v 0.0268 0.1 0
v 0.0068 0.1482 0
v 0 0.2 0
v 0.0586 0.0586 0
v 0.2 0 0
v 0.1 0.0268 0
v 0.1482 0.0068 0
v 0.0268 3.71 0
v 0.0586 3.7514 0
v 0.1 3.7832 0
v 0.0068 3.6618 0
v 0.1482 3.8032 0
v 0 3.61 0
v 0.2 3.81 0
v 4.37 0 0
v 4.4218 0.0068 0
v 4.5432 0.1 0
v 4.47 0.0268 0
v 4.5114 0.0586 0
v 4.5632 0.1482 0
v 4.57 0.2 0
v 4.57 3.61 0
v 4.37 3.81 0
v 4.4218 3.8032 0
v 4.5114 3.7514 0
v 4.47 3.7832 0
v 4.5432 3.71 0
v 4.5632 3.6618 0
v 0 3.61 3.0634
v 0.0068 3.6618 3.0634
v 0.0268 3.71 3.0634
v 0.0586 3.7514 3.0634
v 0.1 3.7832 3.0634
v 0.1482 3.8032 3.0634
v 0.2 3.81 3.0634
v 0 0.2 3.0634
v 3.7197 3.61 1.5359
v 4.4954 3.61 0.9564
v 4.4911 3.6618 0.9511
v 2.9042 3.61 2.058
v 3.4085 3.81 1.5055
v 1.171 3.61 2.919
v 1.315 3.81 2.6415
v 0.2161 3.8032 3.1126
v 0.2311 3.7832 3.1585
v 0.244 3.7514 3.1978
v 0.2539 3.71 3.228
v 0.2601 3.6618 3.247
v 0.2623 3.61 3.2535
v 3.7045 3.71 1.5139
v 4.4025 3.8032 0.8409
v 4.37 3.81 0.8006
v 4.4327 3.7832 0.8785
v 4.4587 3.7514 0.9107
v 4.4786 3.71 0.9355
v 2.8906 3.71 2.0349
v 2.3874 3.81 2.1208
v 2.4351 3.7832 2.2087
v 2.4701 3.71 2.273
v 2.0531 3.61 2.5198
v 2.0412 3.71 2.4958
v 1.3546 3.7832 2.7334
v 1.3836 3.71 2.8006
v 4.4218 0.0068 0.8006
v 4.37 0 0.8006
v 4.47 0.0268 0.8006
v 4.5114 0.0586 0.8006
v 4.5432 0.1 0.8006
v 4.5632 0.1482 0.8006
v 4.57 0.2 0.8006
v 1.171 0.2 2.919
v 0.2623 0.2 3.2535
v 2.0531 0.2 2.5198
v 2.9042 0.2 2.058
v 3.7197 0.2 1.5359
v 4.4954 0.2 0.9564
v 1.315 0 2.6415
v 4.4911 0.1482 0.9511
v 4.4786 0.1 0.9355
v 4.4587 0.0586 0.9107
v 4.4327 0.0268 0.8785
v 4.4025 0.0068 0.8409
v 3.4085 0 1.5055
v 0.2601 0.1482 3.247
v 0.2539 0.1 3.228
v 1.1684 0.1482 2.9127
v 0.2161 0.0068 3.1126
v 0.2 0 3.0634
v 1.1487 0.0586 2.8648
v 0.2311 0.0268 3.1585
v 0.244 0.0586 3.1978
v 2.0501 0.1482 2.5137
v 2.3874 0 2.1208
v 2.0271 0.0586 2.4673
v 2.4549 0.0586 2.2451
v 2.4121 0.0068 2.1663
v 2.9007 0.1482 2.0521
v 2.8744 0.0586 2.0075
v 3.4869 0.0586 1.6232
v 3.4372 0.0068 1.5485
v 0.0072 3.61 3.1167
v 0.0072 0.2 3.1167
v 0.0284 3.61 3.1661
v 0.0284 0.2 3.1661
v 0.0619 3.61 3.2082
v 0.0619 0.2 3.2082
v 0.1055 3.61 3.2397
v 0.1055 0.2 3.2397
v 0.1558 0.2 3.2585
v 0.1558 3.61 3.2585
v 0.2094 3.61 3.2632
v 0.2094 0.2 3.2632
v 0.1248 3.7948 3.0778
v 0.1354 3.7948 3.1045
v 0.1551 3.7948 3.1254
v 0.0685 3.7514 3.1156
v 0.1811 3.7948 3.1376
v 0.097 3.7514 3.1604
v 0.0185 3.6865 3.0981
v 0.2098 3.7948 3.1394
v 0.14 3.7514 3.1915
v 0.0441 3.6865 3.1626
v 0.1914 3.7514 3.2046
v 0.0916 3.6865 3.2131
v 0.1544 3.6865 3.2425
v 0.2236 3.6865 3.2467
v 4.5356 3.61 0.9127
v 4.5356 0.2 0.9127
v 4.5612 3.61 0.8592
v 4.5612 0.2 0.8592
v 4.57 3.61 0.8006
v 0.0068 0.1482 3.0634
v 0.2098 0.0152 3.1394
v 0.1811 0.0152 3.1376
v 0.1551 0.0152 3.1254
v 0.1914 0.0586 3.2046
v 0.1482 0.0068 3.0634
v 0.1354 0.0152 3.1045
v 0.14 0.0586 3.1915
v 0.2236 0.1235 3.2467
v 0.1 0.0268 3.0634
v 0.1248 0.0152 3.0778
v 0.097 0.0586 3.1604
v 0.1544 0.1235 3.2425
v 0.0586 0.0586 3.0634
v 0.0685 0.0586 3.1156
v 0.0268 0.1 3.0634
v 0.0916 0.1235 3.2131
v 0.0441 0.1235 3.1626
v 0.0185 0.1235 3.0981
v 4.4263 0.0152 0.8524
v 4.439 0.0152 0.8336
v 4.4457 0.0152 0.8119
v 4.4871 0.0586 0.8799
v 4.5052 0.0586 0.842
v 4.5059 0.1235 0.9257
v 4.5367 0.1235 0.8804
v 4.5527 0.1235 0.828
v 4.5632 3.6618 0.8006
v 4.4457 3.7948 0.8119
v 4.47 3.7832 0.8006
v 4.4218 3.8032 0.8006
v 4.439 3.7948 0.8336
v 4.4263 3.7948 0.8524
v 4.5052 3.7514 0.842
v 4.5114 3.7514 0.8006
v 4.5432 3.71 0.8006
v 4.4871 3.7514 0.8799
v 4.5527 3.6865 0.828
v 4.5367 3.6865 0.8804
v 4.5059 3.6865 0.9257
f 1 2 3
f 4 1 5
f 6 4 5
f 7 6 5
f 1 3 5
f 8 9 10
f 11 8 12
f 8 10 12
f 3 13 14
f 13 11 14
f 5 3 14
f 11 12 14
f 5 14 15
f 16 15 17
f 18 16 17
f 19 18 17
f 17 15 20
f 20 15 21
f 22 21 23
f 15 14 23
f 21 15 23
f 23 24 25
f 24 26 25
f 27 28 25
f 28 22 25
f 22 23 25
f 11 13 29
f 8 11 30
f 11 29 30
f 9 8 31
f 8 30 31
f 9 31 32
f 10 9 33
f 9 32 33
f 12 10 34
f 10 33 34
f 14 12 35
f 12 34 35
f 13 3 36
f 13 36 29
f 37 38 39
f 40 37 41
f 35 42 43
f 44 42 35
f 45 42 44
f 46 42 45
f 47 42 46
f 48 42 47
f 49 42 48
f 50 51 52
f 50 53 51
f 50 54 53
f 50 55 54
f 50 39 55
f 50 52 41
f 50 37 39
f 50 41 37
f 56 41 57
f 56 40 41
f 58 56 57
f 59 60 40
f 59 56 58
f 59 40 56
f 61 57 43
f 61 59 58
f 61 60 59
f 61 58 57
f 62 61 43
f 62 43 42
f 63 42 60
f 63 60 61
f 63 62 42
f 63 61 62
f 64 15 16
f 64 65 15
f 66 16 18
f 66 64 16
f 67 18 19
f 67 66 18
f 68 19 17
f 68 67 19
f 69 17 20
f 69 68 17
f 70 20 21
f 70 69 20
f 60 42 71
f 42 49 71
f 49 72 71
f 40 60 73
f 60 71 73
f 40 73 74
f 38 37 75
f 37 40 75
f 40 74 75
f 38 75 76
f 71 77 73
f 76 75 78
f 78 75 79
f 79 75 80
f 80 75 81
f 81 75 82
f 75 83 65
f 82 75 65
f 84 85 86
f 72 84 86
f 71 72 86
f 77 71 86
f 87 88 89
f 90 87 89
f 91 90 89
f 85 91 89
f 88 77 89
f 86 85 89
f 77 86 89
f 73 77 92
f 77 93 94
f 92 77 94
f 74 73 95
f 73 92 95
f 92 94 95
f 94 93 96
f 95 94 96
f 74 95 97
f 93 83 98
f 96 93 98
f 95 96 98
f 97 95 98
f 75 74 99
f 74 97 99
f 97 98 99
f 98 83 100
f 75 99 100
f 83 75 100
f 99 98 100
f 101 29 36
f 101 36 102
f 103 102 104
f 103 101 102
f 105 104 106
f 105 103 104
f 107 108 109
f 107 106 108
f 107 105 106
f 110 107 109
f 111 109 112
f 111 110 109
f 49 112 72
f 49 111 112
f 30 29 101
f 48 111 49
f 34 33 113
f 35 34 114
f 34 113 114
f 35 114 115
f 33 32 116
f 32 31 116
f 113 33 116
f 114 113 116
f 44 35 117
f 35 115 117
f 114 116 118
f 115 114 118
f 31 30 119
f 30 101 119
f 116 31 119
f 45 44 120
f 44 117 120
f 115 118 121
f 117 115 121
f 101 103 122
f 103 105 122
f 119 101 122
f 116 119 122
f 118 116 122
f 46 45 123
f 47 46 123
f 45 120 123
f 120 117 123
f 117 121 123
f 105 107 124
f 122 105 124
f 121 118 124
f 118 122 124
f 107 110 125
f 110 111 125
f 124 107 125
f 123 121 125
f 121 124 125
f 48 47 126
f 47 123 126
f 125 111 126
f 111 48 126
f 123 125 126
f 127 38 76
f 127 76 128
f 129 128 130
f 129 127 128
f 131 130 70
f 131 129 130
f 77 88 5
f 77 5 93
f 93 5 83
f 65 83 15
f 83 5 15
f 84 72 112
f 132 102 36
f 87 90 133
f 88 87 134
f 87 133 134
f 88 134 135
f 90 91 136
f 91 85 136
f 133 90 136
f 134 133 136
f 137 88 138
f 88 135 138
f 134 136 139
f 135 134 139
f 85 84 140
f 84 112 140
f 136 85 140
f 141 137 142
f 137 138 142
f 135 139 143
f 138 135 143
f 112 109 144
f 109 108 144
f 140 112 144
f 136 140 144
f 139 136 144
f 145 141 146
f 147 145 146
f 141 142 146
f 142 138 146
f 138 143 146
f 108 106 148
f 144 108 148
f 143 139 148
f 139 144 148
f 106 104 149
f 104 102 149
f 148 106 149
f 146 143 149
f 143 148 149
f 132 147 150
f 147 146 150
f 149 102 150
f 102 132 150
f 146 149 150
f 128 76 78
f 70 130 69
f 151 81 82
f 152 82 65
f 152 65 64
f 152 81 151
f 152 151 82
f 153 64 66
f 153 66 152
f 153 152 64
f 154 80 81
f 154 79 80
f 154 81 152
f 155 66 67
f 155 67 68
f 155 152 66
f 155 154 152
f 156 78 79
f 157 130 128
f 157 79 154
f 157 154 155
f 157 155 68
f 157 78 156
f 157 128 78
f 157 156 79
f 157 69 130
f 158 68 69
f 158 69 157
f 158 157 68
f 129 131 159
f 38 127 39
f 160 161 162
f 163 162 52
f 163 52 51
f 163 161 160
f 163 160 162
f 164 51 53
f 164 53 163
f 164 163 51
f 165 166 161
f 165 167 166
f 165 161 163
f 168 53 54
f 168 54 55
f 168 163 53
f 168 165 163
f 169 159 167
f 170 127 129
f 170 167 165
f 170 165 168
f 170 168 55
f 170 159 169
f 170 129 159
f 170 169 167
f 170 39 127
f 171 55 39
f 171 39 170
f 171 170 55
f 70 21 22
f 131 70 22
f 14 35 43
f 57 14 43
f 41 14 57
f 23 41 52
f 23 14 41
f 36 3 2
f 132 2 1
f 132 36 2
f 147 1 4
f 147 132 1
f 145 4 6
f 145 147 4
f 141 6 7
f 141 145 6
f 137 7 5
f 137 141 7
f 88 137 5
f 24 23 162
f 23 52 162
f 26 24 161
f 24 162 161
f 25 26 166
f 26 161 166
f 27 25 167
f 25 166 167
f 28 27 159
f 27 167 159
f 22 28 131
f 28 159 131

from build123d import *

# Parameters (mm, degrees)
SKETCH1_W           = 4.57
SKETCH1_H           = 3.81
BOSS_EXTRUDE1_DEPTH = 4
CUT_EXTRUDE1_DEPTH  = 10
FILLET1_R           = 0.2


with BuildPart() as part:
    # Sketch1 → Boss-Extrude1 (new body)
    with BuildSketch(Plane.XY):
        with Locations((2.285, 1.905)):
            Rectangle(SKETCH1_W, SKETCH1_H)
    extrude(amount=BOSS_EXTRUDE1_DEPTH)

    # Sketch2 → Cut-Extrude1 (cut)
    with BuildSketch(Plane.XZ):
        with BuildLine():
            ThreePointArc((0, 3.336462357), (2.404002198, 2.339004343), (4.57, 0.895881831))
            Line((4.57, 0.895881831), (4.57, 4))
            Line((4.57, 4), (0, 4))
            Line((0, 4), (0, 3.336462357))
        make_face()
    extrude(amount=-CUT_EXTRUDE1_DEPTH, mode=Mode.SUBTRACT)

    # Fillet1
    fillet1_edges = [part.edges().sort_by_distance(p)[0] for p in [
        (0, 3.81, 1.668231179),
        (4.57, 3.81, 0.447940916),
        (2.404002198, 3.81, 2.339004343),
        (4.57, 0, 0.447940916),
        (0, 0, 1.668231179),
        (4.57, 1.905, 0.895881831),
        (0, 1.905, 3.336462357),
        (2.404002198, 0, 2.339004343),
    ]]
    fillet(fillet1_edges, radius=FILLET1_R)


solid = part.part
